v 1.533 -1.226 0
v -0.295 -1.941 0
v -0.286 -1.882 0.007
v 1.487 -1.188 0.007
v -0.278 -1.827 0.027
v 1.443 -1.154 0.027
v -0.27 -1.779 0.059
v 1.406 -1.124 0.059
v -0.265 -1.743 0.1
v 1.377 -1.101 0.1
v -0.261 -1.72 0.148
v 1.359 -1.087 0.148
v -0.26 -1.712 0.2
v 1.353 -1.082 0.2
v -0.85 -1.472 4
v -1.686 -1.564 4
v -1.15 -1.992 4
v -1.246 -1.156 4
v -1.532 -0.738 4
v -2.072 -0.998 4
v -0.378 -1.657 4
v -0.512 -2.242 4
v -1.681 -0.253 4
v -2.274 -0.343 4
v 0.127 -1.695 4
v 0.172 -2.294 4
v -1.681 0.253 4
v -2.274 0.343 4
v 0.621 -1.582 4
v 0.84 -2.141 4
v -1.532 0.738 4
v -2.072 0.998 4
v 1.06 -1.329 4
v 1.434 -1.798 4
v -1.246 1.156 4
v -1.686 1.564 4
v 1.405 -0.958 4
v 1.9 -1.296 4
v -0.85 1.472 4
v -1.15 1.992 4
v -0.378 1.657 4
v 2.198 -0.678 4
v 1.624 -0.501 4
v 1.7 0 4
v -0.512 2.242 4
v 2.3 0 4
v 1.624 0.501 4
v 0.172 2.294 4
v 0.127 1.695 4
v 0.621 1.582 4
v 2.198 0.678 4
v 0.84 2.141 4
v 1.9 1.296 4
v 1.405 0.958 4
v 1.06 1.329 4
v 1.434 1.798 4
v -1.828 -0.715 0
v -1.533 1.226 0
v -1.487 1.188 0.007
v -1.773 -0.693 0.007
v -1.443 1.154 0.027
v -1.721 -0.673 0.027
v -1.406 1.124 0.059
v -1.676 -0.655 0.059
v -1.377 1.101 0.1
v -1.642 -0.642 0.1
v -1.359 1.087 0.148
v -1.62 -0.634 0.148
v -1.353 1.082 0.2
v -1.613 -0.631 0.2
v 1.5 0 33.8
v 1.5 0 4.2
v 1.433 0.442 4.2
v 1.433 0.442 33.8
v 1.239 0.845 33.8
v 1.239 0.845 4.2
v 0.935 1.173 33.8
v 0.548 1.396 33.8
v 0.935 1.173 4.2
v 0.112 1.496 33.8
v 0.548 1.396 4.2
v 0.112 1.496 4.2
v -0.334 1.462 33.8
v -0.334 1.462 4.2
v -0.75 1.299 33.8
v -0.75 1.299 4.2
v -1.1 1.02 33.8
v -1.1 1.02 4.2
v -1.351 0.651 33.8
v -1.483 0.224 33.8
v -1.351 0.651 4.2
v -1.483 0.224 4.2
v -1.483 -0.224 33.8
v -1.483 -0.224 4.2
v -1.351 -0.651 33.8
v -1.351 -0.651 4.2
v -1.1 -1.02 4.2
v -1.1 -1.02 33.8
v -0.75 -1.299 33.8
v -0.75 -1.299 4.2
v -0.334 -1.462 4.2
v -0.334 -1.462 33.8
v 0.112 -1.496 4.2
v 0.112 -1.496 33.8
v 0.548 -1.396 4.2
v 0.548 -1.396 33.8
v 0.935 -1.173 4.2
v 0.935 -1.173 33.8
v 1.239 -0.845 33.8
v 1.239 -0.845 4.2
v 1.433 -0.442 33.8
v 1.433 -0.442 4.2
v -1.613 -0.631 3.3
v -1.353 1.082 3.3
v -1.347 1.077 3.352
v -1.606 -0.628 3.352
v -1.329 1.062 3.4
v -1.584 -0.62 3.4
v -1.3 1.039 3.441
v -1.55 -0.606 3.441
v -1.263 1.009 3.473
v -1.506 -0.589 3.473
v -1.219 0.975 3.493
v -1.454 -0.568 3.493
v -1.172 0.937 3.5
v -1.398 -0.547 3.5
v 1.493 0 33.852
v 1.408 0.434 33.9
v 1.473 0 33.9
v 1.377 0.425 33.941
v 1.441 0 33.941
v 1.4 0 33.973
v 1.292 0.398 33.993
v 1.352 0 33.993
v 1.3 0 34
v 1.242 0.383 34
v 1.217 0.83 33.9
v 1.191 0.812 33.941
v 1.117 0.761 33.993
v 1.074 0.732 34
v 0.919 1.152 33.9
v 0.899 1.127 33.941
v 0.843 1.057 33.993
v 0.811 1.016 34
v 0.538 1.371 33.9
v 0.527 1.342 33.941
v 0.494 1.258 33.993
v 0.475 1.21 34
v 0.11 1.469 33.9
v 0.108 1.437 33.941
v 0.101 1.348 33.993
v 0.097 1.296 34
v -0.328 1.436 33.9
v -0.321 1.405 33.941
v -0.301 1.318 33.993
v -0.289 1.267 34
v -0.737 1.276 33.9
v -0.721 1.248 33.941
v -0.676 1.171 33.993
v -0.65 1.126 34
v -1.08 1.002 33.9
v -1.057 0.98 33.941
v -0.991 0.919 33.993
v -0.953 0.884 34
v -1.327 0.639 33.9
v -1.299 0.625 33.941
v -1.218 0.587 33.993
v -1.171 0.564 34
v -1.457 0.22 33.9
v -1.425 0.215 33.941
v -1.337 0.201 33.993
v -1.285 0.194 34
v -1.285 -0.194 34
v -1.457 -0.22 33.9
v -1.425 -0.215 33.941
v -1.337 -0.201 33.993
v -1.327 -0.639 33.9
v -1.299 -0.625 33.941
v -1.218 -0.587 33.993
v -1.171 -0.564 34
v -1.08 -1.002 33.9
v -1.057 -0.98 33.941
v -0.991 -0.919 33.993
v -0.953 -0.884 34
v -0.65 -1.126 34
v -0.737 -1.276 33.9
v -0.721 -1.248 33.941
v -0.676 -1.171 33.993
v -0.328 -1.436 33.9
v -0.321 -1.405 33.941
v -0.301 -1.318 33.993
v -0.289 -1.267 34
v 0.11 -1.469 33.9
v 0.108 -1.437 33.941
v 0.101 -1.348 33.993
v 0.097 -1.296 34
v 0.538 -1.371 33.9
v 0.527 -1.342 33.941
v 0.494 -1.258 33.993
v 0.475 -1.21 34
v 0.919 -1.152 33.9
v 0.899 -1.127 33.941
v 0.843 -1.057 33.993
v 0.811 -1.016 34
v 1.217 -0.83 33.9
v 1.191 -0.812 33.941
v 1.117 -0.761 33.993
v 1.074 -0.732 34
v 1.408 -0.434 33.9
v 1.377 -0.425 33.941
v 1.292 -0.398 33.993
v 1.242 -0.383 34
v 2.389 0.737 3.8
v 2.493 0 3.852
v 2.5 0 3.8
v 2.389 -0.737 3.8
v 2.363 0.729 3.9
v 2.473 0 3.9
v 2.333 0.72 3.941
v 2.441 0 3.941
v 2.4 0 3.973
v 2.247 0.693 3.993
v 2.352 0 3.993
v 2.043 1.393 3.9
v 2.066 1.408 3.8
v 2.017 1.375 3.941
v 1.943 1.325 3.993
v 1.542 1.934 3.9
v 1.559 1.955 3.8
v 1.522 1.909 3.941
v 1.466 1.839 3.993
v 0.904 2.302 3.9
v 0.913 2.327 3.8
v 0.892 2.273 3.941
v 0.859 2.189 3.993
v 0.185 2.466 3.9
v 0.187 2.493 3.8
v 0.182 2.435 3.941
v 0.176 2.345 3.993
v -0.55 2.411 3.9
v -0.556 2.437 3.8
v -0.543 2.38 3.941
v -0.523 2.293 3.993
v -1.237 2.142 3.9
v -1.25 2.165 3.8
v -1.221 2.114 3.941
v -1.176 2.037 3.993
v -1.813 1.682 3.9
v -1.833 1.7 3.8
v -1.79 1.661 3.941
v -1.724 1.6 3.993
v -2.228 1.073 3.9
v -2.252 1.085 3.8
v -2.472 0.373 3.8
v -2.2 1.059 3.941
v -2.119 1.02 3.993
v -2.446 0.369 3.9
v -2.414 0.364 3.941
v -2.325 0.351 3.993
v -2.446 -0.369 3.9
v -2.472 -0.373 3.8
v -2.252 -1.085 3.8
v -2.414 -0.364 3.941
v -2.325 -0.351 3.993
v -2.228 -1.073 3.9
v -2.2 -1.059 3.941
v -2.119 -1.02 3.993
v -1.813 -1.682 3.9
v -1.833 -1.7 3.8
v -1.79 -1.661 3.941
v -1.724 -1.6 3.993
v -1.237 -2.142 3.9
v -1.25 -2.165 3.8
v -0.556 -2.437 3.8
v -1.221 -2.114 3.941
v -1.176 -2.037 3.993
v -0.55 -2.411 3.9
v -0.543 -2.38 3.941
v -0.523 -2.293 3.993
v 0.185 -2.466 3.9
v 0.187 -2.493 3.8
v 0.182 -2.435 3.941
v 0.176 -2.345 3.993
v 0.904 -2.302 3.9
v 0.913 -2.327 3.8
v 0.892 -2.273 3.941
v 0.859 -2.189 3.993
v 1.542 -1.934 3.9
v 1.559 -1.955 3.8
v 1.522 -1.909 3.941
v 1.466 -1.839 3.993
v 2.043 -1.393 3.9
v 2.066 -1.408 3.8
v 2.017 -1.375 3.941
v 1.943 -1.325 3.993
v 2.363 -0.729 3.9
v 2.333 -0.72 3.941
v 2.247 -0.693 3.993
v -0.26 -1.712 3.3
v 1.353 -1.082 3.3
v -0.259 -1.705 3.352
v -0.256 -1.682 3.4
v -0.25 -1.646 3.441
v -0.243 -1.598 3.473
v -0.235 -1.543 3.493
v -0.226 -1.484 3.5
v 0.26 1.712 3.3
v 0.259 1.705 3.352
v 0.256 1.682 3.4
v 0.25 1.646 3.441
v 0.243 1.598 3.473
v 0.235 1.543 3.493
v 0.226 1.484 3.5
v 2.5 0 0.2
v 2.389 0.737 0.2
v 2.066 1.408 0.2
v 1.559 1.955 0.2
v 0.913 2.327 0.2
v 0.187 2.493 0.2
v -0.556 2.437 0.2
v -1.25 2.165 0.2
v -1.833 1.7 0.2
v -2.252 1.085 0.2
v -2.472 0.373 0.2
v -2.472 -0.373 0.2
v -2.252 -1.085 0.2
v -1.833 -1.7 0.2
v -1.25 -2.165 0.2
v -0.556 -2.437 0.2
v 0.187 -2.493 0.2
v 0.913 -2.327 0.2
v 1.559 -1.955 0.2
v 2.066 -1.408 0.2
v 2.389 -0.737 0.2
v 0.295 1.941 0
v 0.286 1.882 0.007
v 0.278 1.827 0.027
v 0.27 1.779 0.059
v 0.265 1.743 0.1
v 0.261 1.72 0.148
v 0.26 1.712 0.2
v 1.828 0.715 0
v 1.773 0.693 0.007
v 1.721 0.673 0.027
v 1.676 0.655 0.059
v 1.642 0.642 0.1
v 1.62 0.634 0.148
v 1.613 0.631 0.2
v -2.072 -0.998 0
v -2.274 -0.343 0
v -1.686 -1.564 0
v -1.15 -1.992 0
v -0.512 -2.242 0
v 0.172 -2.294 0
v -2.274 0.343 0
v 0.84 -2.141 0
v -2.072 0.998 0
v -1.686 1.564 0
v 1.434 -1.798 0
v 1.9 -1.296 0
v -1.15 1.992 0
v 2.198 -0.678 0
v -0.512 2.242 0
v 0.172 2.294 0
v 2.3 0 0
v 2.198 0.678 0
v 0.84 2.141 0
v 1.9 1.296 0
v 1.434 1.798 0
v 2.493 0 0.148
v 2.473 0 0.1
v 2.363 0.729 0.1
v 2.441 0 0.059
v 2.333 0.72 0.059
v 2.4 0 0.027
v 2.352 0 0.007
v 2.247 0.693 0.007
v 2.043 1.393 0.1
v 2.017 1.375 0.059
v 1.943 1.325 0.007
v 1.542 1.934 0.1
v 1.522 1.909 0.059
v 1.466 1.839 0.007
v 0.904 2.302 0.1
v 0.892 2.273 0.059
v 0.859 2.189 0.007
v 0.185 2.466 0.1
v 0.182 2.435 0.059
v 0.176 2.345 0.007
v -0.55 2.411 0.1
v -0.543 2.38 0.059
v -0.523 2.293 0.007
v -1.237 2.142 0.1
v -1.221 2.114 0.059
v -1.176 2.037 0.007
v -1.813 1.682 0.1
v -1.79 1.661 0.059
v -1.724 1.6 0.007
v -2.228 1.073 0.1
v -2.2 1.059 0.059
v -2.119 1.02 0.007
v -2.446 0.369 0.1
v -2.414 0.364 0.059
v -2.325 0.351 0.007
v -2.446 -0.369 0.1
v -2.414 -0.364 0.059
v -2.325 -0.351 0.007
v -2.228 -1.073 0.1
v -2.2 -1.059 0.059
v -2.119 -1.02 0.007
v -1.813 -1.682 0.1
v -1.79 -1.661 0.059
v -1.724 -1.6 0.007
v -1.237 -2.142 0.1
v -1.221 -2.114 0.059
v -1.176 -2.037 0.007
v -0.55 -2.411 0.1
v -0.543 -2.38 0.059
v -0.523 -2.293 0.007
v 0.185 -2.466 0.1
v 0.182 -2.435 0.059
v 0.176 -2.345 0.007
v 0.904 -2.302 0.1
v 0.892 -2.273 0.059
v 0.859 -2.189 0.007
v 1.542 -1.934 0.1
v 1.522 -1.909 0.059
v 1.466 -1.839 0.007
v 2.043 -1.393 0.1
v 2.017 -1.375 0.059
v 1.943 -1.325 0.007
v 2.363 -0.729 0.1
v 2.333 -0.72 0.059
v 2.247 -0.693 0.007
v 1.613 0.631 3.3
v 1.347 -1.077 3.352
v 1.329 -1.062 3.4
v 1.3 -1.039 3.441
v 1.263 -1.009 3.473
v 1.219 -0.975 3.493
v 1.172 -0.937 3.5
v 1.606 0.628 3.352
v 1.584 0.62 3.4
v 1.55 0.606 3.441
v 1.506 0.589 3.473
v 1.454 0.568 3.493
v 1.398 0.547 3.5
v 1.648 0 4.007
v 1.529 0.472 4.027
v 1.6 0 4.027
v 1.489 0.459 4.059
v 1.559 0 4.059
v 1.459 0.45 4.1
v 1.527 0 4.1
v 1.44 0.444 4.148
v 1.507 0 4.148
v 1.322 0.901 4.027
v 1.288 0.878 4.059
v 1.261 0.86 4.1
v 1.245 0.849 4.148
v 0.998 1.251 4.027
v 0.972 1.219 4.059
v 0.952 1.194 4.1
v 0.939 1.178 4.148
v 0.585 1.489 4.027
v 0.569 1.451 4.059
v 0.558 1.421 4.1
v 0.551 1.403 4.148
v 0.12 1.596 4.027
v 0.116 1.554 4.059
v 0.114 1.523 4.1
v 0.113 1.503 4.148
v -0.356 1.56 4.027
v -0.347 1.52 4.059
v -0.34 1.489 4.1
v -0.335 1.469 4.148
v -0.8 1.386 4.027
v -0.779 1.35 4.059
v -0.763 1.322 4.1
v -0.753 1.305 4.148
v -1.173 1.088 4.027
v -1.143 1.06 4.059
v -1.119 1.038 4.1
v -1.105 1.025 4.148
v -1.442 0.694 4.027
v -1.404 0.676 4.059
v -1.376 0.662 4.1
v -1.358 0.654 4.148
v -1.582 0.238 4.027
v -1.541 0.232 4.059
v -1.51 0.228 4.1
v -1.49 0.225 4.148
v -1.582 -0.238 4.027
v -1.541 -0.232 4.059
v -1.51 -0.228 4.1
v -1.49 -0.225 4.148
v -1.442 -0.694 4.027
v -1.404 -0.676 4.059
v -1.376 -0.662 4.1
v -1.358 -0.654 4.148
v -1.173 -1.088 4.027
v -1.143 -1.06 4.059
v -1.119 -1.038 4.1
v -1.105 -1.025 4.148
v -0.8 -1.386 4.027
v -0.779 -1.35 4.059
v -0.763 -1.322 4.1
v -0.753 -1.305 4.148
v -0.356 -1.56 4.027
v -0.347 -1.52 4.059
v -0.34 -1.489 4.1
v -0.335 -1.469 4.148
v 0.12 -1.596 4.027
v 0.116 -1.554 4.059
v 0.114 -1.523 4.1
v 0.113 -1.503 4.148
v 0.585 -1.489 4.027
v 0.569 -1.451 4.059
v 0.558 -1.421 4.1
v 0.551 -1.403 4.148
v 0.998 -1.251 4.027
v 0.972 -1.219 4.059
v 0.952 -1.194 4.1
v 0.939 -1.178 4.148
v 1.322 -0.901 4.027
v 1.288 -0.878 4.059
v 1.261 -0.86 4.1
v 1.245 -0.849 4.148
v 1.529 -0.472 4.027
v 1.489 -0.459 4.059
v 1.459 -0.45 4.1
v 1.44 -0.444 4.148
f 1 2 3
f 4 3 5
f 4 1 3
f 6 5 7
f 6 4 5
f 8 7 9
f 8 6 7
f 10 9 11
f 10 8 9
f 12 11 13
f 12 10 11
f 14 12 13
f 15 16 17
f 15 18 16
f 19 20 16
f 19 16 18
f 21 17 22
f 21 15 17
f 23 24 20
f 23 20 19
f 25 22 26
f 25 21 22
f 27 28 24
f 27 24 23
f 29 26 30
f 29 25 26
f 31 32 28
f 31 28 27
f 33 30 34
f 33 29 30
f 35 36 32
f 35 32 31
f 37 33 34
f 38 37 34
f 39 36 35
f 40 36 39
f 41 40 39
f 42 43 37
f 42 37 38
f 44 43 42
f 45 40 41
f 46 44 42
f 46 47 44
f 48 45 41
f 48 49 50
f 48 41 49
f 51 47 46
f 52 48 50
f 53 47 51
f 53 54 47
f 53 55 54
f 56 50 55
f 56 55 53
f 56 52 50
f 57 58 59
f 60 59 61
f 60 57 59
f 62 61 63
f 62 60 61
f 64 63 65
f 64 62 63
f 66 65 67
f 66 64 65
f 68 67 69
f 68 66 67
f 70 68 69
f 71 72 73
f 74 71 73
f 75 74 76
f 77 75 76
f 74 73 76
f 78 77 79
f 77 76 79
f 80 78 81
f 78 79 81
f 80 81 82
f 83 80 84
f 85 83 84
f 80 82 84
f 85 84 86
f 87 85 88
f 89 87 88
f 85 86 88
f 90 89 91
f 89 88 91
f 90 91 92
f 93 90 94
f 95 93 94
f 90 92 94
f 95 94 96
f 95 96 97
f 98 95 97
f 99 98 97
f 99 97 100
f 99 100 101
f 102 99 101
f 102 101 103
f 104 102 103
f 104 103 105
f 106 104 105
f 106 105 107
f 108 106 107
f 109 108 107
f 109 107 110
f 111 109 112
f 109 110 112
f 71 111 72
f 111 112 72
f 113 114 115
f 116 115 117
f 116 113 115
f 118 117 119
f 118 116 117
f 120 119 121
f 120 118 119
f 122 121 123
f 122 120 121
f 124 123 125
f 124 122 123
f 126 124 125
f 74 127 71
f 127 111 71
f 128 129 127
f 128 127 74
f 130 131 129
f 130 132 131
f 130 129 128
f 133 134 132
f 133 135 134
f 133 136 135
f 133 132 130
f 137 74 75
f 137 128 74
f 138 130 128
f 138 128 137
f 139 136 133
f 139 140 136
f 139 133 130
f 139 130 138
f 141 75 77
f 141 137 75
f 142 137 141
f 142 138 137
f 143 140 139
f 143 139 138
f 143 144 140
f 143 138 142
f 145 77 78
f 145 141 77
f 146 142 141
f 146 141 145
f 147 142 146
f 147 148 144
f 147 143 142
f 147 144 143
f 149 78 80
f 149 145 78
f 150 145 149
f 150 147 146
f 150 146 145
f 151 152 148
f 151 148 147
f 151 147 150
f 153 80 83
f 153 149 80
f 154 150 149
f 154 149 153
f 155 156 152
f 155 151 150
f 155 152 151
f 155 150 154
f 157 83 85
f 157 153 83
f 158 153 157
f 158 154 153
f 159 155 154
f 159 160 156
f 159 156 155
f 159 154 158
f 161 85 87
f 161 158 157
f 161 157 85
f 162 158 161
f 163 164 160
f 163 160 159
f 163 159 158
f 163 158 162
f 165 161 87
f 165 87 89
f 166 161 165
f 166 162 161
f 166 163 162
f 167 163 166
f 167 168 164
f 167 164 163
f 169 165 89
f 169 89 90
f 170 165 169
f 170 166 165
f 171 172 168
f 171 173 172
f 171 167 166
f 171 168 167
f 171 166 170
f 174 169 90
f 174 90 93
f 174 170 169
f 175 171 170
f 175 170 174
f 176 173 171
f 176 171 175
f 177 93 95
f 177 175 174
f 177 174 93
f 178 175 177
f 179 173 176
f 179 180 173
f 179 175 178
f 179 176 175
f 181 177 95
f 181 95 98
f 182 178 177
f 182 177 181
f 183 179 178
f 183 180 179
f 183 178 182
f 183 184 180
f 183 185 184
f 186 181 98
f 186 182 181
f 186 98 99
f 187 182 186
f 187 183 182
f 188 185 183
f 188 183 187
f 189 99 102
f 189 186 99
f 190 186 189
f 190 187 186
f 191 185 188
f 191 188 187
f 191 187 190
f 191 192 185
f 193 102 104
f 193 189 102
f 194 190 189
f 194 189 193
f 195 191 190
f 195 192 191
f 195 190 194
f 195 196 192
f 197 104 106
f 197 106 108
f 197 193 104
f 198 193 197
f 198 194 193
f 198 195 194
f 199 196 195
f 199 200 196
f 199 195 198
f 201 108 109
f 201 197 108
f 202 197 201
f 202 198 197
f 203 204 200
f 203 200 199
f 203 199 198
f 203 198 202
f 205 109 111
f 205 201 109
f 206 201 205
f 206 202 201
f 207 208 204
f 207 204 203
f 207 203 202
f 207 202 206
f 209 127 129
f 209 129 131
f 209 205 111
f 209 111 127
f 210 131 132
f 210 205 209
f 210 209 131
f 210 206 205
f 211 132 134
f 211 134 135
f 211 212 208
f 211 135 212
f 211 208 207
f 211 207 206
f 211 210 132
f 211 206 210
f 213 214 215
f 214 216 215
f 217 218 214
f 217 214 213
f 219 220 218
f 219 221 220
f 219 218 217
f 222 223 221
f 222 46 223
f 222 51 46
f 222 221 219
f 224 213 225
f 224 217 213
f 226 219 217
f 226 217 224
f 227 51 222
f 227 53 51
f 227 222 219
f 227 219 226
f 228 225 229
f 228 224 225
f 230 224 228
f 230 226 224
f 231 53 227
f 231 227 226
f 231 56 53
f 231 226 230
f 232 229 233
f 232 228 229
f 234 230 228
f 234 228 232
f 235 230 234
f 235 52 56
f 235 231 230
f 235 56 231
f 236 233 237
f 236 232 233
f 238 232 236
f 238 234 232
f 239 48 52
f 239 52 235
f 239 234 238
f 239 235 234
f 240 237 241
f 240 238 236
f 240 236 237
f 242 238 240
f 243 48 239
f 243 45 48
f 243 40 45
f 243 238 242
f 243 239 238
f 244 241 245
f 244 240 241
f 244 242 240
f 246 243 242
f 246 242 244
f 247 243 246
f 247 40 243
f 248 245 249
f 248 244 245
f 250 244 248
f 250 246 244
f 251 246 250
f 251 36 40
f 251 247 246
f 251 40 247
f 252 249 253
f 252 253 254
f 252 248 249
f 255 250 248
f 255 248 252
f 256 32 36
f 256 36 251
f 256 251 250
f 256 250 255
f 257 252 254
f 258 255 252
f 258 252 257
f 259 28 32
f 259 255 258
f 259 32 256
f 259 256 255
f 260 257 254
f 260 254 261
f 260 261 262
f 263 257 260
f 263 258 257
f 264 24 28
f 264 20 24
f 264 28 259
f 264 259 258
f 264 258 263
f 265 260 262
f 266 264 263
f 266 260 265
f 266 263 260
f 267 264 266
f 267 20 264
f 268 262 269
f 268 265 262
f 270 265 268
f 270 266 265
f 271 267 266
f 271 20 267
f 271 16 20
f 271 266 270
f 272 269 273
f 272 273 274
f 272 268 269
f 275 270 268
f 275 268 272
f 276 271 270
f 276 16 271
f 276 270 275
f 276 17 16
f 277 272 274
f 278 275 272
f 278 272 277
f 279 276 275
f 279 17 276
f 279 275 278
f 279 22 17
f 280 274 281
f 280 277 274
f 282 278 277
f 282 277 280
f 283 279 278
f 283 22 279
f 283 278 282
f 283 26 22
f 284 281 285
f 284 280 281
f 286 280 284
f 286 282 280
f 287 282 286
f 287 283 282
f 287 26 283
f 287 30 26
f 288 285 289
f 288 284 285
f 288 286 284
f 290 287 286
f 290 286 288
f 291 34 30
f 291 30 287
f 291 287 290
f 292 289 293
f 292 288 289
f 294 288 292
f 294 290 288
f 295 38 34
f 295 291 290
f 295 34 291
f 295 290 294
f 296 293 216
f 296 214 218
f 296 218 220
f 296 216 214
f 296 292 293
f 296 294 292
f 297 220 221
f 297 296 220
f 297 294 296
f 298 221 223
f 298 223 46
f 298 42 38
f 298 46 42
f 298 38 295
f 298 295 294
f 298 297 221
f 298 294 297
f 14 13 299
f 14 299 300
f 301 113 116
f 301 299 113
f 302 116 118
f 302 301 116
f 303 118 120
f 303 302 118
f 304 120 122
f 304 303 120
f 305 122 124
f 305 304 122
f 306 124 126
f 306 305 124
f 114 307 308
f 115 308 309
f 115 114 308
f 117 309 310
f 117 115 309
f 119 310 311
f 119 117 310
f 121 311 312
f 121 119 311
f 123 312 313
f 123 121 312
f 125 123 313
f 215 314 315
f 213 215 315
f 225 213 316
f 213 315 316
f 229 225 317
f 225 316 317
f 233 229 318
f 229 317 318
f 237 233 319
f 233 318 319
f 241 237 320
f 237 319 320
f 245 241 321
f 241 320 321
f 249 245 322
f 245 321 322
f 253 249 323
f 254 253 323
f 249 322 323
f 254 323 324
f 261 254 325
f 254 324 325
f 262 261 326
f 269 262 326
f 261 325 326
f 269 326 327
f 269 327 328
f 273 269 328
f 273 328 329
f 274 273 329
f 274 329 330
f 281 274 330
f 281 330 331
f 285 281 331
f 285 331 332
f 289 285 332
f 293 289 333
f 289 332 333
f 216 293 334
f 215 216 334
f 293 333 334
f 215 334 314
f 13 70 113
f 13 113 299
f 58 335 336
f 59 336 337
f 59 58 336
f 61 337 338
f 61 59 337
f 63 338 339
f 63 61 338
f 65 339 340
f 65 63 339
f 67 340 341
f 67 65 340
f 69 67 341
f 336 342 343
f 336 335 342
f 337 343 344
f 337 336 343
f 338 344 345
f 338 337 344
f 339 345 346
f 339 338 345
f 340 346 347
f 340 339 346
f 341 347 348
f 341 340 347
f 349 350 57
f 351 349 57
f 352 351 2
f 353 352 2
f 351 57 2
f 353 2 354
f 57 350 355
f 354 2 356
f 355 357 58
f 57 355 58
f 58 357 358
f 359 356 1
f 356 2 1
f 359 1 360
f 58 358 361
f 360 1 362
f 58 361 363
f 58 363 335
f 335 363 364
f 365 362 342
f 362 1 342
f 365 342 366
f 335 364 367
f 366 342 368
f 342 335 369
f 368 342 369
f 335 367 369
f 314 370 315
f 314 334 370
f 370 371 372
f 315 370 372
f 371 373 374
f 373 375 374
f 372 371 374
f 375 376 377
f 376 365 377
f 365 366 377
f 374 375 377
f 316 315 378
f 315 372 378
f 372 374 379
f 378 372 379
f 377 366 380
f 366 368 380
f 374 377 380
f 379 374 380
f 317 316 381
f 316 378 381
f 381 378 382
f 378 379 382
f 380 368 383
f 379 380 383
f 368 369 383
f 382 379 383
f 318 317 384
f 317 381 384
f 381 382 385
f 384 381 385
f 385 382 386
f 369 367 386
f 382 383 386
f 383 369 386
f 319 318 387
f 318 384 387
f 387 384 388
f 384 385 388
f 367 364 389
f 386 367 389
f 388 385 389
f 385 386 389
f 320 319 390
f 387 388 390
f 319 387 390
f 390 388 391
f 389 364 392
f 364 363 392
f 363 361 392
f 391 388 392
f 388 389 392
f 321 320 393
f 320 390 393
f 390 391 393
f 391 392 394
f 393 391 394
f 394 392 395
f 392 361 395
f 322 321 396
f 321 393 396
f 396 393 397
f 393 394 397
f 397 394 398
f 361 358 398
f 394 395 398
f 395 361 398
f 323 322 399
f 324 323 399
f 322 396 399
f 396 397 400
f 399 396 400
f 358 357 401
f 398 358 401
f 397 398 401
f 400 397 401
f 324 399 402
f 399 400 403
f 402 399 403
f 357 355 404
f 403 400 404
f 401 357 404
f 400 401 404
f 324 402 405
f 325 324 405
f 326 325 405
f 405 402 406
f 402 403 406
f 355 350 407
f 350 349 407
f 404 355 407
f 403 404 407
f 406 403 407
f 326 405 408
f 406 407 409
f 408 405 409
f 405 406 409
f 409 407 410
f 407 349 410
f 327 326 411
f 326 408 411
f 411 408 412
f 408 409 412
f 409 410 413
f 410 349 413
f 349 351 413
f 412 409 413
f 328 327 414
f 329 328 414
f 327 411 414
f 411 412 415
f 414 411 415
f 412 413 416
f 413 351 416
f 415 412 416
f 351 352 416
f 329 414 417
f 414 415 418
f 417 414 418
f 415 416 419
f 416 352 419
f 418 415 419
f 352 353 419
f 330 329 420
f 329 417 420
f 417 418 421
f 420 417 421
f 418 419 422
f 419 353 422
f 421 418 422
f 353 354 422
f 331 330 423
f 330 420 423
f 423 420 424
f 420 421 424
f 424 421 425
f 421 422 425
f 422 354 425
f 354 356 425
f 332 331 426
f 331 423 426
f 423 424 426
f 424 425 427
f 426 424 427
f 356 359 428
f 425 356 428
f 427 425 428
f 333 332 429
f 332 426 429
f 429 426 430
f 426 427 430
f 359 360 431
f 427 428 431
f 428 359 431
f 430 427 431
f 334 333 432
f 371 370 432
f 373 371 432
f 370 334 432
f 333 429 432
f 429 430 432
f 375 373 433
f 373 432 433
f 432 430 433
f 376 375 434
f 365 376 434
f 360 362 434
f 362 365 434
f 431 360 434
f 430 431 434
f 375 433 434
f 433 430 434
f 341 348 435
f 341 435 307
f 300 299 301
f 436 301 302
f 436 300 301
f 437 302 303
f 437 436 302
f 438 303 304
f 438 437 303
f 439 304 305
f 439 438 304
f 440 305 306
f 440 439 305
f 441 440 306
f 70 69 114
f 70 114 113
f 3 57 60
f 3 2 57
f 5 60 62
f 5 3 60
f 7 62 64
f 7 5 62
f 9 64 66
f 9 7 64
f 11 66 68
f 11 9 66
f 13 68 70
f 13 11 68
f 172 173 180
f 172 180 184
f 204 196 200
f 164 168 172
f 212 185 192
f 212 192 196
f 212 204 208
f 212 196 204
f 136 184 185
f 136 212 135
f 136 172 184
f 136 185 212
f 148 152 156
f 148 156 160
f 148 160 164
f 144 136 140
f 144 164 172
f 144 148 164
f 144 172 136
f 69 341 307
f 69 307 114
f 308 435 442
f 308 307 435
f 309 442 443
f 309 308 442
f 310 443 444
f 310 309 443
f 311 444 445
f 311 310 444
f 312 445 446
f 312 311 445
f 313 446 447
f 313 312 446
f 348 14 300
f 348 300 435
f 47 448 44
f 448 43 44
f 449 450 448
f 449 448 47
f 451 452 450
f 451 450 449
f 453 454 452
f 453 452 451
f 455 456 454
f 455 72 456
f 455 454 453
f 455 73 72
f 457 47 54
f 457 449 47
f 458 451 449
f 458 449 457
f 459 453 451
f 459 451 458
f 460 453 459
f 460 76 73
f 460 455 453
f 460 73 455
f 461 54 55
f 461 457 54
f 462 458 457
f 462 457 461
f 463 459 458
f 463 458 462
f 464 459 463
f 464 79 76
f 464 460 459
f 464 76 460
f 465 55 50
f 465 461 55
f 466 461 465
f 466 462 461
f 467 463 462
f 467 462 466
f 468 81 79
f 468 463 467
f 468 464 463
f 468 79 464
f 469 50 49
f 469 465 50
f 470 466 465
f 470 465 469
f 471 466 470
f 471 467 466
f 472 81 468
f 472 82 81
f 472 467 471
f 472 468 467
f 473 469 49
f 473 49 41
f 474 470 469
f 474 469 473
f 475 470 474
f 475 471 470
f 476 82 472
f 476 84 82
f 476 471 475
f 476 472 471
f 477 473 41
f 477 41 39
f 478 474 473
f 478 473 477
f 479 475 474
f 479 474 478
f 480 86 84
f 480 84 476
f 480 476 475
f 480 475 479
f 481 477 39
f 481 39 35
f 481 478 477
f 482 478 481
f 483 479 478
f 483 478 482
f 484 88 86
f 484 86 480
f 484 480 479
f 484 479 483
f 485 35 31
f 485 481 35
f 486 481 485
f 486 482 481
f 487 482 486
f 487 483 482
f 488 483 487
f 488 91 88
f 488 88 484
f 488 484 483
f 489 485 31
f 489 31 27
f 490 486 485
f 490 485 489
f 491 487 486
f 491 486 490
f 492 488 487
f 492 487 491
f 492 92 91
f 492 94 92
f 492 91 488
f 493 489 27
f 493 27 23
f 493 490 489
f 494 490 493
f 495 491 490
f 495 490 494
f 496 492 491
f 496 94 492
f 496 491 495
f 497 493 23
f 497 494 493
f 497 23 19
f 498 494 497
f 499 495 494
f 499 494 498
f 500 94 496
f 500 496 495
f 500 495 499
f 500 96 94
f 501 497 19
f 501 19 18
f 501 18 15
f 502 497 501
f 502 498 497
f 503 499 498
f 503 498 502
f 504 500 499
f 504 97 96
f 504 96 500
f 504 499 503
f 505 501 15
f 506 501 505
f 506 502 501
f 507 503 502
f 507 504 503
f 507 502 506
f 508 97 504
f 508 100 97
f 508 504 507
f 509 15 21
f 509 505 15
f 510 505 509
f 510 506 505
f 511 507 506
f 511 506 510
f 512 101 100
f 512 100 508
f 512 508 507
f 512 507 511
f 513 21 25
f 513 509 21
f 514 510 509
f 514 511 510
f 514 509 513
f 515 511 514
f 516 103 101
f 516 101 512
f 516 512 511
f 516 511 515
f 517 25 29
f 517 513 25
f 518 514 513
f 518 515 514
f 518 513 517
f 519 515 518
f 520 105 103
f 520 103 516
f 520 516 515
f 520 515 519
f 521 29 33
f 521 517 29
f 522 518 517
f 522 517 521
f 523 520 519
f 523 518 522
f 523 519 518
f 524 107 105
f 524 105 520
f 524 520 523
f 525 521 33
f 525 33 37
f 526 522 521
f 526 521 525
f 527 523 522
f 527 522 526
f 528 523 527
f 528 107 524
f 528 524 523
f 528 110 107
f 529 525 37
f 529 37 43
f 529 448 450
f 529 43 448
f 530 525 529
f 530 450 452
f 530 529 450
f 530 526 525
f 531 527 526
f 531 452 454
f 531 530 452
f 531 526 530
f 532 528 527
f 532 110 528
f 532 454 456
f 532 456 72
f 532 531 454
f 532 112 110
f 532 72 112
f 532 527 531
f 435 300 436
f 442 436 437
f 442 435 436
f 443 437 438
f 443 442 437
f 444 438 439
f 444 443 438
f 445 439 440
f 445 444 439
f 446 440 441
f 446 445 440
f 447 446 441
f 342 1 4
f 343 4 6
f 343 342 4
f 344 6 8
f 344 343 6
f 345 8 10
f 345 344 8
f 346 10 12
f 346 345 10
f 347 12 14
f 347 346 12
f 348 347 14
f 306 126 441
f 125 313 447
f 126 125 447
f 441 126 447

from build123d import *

# Parameters (mm, degrees)
F0_R     = 2.5
F1_DEPTH = 4
F2_DEPTH = 3.5
F3_R     = 1.5
F4_DEPTH = 30
F5_R     = 0.2


with BuildPart() as f1:
    # F0 (on Top) → F1 (new body)
    with BuildSketch(Plane.XY):
        Circle(F0_R)
        Polygon((-1.3528307096, 1.0815956135), (0.2602739232, 1.7123835683), (1.6131046327, 0.6307879547), (1.3528307096, -1.0815956135), (-0.2602739232, -1.7123835683), (-1.6131046327, -0.6307879547), align=None, mode=Mode.SUBTRACT)
        Polygon((1.6131046327, 0.6307879547), (0.2602739232, 1.7123835683), (-1.3528307096, 1.0815956135), (-1.6131046327, -0.6307879547), (-0.2602739232, -1.7123835683), (1.3528307096, -1.0815956135), align=None)
    extrude(amount=F1_DEPTH)

    # F0 (on Top) → F2 (cut)
    with BuildSketch(Plane.XY):
        Polygon((1.6131046327, 0.6307879547), (0.2602739232, 1.7123835683), (-1.3528307096, 1.0815956135), (-1.6131046327, -0.6307879547), (-0.2602739232, -1.7123835683), (1.3528307096, -1.0815956135), align=None)
    extrude(amount=F2_DEPTH, mode=Mode.SUBTRACT)

    # F3 (on face) → F4 (join)
    with BuildSketch(Plane.XY.offset(4)):
        Circle(F3_R)
    extrude(amount=F4_DEPTH)

    # F5
    f5_edges = [f1.edges().sort_by_distance(p)[0] for p in [
        (-1.5, 0, 4),
        (-1.5, 0, 34),
        (2.5, 0, 2),
        (-2.5, 0, 0),
        (-2.5, 0, 4),
        (-0.546278, 1.39699, 0),
        (0.546278, -1.39699, 3.5),
        (1.482968, -0.225404, 3.5),
        (0.936689, 1.171586, 3.5),
        (-0.546278, 1.39699, 3.5),
        (-1.482968, 0.225404, 3.5),
        (-0.936689, -1.171586, 3.5),
        (0.546278, -1.39699, 0),
        (-0.936689, -1.171586, 0),
        (-1.482968, 0.225404, 0),
        (0.936689, 1.171586, 0),
        (1.482968, -0.225404, 0),
    ]]
    fillet(f5_edges, radius=F5_R)


solid = f1.part
